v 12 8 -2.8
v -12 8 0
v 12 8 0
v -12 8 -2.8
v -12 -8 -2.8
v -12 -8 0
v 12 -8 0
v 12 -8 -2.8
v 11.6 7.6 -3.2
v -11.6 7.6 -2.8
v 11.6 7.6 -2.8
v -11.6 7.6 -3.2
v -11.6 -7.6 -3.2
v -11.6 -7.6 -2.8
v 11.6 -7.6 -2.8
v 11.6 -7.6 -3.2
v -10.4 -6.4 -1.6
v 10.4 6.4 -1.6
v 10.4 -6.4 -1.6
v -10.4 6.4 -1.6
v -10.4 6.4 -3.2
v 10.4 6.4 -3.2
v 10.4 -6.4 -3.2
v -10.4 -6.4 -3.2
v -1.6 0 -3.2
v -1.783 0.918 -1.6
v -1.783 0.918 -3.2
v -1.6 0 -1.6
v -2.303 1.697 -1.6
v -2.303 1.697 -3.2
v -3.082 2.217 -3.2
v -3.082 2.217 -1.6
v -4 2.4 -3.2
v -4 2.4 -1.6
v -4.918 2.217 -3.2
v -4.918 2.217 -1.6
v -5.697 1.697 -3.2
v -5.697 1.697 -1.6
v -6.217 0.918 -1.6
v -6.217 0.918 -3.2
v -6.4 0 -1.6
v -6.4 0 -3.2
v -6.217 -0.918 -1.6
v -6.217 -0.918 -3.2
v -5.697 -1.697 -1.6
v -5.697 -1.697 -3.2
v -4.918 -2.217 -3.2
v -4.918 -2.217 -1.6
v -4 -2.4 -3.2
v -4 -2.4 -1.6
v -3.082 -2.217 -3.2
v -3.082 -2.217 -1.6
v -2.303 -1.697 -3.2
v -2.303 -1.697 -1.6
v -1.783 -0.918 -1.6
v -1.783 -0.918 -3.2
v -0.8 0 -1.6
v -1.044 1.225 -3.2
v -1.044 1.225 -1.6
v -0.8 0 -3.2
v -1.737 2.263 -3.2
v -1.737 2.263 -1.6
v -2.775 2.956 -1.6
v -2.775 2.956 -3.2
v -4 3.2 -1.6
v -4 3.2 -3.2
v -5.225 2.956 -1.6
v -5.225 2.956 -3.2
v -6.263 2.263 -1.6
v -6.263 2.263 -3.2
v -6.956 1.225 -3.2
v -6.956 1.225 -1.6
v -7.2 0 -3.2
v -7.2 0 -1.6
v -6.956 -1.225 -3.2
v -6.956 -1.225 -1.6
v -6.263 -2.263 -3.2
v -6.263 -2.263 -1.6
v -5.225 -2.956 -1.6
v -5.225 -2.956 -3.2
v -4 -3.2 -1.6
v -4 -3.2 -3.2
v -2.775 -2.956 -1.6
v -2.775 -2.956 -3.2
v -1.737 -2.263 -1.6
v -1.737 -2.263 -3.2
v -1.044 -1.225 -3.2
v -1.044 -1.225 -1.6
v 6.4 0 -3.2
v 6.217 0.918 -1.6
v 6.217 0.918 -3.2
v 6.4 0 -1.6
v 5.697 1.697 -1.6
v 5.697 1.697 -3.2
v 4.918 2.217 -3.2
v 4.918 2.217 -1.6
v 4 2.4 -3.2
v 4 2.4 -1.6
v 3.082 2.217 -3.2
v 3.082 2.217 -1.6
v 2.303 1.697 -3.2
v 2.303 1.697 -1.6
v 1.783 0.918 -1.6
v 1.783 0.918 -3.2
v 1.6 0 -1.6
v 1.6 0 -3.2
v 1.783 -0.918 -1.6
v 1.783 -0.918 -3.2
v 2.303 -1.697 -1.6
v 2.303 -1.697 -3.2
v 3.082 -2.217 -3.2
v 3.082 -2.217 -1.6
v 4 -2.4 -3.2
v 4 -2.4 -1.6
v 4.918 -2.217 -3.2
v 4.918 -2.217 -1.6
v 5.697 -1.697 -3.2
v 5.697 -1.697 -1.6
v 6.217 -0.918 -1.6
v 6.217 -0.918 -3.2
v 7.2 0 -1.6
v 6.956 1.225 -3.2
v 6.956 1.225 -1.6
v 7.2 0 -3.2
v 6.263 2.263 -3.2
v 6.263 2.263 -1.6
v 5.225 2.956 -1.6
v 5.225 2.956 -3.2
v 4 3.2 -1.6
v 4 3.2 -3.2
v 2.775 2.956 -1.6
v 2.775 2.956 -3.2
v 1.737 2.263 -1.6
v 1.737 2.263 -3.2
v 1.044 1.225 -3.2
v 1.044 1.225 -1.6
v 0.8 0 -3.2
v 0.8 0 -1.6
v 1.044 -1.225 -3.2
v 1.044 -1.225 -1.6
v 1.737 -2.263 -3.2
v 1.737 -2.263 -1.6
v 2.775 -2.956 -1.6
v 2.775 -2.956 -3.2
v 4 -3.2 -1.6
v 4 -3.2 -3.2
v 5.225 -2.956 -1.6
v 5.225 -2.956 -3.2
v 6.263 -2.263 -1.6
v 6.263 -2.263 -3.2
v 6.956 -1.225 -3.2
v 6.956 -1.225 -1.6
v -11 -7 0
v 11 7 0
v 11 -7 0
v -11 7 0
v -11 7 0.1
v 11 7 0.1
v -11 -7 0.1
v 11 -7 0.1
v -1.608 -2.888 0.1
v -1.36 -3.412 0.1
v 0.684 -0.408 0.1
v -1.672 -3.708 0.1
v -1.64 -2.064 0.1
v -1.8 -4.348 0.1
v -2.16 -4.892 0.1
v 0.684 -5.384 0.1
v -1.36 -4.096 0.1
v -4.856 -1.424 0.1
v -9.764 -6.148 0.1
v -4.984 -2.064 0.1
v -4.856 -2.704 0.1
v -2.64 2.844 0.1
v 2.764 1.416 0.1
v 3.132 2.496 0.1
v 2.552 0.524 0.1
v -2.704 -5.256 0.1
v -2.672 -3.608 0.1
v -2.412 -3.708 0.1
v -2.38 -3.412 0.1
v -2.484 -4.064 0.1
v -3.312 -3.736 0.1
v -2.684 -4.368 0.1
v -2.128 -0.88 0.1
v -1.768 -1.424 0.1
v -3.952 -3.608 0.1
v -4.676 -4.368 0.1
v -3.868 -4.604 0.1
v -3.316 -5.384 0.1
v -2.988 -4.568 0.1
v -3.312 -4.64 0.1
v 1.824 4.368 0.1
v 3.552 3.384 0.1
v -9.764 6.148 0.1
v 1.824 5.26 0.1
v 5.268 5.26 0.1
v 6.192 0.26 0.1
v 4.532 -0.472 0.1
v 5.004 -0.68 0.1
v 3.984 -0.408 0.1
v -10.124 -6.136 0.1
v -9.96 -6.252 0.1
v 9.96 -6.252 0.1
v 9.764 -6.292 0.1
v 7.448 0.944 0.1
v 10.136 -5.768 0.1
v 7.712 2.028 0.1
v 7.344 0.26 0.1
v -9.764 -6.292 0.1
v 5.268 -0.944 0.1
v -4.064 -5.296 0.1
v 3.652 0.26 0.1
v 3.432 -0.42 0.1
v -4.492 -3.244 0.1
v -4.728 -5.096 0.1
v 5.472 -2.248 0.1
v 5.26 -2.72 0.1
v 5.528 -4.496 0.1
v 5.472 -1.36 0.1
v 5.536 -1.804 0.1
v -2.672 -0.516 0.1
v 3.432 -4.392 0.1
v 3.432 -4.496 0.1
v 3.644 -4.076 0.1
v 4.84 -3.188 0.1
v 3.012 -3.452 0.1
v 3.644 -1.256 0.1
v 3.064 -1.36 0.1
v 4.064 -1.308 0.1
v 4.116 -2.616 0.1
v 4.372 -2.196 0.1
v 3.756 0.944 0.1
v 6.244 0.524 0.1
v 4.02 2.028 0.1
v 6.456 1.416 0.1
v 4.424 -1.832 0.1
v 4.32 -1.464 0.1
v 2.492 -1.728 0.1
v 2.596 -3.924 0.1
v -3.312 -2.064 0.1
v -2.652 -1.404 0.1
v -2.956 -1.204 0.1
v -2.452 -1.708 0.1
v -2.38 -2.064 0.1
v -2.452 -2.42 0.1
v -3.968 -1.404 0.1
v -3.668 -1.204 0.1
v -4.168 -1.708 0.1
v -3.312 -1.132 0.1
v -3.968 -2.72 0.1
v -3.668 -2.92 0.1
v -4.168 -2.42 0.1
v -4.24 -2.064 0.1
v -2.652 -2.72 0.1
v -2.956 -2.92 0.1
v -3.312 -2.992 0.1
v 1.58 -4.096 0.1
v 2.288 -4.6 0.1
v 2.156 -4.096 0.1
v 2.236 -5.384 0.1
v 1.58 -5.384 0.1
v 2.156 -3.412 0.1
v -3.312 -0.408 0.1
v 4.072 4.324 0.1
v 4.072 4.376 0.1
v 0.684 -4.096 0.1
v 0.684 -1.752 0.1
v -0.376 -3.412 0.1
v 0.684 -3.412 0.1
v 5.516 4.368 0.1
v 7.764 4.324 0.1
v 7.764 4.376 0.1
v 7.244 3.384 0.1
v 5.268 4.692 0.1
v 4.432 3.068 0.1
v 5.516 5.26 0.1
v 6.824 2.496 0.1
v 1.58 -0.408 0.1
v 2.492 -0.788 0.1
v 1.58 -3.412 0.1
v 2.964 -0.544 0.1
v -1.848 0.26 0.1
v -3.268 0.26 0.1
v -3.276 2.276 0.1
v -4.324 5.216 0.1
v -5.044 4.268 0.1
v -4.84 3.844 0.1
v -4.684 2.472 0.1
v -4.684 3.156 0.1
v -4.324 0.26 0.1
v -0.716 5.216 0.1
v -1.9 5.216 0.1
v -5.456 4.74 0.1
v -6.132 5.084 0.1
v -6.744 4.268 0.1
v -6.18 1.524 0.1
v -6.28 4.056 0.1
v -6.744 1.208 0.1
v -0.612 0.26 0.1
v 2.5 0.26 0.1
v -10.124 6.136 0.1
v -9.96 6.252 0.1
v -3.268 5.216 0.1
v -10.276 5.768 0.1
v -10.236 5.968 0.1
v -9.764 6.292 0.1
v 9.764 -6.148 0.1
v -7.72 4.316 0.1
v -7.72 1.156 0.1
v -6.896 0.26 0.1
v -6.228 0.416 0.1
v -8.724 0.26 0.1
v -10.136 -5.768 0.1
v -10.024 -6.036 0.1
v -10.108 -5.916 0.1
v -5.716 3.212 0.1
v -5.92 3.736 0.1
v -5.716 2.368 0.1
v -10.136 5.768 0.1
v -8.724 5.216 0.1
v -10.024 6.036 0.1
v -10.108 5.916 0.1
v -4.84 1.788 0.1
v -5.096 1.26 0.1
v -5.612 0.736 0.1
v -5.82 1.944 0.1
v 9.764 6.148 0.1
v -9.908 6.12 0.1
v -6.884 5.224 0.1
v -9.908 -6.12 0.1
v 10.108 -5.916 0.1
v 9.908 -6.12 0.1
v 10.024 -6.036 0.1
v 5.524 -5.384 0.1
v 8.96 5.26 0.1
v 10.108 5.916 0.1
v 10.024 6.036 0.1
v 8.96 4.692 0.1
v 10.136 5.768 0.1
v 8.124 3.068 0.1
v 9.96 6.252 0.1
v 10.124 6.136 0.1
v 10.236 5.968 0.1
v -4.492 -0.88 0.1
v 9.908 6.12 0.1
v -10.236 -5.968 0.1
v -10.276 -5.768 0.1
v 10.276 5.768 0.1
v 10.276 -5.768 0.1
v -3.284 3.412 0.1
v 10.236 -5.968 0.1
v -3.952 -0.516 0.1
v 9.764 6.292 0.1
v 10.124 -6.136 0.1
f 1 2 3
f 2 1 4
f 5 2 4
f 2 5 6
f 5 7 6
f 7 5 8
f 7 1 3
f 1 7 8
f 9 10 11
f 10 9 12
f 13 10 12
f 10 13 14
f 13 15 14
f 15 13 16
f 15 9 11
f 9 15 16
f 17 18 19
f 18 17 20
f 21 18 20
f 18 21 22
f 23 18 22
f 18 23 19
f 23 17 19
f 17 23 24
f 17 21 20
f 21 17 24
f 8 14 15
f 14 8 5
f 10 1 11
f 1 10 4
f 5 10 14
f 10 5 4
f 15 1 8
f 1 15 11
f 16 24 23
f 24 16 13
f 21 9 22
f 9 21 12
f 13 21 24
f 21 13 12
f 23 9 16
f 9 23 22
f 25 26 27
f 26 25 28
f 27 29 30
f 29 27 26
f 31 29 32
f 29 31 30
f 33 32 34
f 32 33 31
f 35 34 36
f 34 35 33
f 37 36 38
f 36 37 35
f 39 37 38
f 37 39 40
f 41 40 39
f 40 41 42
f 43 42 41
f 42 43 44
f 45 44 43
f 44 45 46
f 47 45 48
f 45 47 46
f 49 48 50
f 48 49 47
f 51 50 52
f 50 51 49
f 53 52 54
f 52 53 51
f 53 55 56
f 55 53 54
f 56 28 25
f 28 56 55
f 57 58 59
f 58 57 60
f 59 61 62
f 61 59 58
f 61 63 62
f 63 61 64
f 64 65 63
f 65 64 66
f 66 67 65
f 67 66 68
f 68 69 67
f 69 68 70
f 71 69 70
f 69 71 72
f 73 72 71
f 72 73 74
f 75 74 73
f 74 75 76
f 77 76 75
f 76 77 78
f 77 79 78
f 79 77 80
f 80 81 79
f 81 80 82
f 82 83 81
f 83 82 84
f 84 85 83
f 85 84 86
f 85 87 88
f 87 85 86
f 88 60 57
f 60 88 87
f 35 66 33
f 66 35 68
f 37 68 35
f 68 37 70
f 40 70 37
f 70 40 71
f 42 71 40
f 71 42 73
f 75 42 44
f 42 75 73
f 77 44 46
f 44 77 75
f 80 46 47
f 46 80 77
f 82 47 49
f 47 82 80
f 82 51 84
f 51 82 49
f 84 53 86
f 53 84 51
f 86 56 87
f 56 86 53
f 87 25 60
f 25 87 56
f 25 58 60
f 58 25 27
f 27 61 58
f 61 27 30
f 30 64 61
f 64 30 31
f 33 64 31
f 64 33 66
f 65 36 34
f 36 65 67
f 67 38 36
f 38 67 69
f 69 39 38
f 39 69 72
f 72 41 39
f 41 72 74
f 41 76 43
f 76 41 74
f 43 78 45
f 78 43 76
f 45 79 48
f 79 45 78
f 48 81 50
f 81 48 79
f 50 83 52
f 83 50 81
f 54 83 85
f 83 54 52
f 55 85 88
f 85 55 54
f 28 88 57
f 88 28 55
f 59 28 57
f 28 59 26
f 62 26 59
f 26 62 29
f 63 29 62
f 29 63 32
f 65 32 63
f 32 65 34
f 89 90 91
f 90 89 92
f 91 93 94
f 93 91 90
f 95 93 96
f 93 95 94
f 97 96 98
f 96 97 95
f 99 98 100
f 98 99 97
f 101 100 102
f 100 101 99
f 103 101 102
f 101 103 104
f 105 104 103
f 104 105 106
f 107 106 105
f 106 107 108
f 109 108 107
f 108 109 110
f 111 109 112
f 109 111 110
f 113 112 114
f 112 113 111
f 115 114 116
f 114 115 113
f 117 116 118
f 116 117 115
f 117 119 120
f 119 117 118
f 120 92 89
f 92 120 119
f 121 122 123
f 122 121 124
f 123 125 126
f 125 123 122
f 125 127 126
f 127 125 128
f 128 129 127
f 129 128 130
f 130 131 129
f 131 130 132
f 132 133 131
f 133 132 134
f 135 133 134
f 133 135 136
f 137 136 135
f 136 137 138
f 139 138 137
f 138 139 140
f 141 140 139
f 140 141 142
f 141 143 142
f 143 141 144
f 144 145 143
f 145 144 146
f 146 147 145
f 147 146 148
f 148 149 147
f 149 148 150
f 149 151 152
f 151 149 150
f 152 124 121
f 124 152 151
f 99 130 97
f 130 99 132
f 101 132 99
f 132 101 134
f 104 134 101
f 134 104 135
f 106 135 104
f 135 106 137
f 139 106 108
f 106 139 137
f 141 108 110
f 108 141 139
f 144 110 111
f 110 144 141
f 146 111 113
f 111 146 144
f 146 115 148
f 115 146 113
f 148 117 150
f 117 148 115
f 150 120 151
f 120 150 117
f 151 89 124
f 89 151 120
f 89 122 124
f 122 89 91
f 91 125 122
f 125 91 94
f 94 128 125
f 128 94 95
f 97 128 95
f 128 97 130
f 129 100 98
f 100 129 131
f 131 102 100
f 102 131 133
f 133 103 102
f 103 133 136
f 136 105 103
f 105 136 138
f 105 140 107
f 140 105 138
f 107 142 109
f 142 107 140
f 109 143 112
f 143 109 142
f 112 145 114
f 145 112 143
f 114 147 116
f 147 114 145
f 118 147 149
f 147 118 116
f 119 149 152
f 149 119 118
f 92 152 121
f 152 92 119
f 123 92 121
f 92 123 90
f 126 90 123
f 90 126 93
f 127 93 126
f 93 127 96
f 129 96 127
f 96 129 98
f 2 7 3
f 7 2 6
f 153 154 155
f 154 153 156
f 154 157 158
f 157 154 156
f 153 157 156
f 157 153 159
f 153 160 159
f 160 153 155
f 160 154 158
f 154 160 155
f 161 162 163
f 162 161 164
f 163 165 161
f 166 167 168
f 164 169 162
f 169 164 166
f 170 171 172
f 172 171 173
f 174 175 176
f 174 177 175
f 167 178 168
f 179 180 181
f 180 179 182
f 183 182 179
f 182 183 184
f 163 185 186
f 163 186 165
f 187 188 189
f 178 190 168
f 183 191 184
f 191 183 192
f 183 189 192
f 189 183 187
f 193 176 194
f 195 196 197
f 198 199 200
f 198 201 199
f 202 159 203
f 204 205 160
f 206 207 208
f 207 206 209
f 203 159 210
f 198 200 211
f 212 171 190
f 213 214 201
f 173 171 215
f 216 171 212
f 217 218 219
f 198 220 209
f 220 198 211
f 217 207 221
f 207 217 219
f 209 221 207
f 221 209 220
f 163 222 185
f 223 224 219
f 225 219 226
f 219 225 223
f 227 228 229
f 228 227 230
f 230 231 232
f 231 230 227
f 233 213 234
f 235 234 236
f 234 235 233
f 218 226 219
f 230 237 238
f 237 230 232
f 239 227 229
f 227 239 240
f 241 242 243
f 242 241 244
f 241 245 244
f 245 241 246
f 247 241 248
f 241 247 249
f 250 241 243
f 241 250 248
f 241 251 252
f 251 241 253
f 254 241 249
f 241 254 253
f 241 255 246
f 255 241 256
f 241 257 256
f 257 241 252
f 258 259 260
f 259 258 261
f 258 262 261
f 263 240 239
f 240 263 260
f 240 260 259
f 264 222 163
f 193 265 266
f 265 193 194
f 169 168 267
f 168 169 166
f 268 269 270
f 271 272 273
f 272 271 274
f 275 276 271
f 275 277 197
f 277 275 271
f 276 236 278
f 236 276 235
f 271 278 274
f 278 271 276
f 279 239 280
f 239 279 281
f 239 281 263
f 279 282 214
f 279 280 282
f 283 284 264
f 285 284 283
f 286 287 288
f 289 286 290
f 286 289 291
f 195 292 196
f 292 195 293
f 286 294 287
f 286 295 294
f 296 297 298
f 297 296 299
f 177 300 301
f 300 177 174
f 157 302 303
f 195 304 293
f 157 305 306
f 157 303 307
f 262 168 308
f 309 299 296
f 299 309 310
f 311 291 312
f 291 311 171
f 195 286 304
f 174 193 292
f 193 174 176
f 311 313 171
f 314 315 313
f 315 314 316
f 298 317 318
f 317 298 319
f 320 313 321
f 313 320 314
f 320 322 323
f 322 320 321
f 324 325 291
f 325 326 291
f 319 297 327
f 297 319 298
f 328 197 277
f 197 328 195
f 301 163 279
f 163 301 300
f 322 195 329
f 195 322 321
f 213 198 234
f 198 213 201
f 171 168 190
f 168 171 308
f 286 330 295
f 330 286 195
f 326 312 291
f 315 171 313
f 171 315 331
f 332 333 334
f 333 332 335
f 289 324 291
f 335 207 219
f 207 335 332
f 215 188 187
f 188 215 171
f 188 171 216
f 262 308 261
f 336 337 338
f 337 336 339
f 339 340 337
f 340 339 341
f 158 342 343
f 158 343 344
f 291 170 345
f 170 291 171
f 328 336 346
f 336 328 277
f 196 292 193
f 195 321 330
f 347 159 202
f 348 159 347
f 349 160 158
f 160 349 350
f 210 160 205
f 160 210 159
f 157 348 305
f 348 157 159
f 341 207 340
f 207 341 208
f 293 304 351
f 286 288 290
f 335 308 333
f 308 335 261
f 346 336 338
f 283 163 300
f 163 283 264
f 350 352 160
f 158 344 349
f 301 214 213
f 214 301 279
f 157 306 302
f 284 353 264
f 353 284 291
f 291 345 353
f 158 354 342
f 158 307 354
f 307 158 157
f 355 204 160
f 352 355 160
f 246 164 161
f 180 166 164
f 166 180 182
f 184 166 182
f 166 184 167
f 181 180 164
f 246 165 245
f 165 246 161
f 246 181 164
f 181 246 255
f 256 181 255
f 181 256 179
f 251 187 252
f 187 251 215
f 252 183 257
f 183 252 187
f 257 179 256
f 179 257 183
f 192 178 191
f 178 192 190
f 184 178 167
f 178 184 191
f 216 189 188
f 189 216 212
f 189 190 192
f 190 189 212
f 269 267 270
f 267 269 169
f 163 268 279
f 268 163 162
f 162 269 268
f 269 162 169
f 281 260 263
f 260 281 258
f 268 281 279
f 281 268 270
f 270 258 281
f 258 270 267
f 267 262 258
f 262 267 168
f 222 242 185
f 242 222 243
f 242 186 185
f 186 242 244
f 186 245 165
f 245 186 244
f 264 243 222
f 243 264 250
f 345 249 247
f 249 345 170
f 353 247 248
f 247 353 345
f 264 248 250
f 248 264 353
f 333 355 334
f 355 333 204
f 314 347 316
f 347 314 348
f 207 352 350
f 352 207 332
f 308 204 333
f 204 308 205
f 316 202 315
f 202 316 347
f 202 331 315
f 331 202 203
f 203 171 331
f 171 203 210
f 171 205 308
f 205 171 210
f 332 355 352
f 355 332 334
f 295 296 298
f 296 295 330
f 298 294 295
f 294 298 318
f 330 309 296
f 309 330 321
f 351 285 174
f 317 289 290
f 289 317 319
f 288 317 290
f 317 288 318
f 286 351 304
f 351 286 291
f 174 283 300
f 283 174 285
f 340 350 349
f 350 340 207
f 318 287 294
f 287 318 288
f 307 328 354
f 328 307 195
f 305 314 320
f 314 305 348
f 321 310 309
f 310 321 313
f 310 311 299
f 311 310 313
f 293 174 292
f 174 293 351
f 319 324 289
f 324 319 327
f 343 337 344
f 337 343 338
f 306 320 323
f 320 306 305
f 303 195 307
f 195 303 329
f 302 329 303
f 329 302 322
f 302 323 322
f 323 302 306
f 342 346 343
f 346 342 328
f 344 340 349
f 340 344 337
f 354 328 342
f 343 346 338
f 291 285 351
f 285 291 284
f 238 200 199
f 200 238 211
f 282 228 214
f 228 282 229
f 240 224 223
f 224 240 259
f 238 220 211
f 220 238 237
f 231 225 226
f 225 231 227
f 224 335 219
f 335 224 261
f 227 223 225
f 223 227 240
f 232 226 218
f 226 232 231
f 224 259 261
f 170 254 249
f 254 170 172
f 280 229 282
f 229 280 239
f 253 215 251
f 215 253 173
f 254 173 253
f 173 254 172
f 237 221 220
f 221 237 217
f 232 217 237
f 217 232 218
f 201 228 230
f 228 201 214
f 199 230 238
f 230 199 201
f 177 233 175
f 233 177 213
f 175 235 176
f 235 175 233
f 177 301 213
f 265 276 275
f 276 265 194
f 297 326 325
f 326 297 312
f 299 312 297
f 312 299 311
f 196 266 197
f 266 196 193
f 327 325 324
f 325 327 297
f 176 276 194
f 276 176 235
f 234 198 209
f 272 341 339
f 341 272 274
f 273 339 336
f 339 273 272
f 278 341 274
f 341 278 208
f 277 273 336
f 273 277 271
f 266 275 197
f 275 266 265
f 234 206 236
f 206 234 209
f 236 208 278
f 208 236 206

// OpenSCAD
use <../lib.scad>
use <26603.scad>
use <6372023o.scad>
function ldraw_lib__26603d0q() = [
// 0 Tile  2 x  3 with "DK 77 942" Licence Plate Sticker
// 0 Name: 26603d0q.dat
// 0 Author: Vincent Messenet [Cheenzo]
// 0 !LDRAW_ORG Shortcut UPDATE 2026-07
// 0 !LICENSE Licensed under CC BY 4.0 : see CAreadme.txt
// 
// 0 BFC CERTIFY CCW
  [0,"BFC","CERTIFY"],
  [0,"BFC","CCW"],
// 
// 0 !CATEGORY Sticker Shortcut
// 0 !KEYWORDS Bricklink 26603pb225, Fiat 500, set 77942
// 
// 0 !HISTORY 2026-07-30 [OrionP] Official Update 2026-07
// 
// 1 16 0 0 0 1 0 0 0 1 0 0 0 1 26603.dat
  [1,16,0,0,0,1,0,0,0,1,0,0,0,1, ldraw_lib__26603()],
// 1 16 0 0 0 1 0 0 0 1 0 0 0 1 6372023o.dat
  [1,16,0,0,0,1,0,0,0,1,0,0,0,1, ldraw_lib__6372023o()],
];
module ldraw_lib__26603d0q(step=0, col=false, unit=2/5, alt=false, line=0.2, solid=!$preview)
    makepoly(ldraw_lib__26603d0q(), step=step, col=col, unit=unit, alt=alt, line=line, solid=solid);
ldraw_lib__26603d0q(line=0.2);
